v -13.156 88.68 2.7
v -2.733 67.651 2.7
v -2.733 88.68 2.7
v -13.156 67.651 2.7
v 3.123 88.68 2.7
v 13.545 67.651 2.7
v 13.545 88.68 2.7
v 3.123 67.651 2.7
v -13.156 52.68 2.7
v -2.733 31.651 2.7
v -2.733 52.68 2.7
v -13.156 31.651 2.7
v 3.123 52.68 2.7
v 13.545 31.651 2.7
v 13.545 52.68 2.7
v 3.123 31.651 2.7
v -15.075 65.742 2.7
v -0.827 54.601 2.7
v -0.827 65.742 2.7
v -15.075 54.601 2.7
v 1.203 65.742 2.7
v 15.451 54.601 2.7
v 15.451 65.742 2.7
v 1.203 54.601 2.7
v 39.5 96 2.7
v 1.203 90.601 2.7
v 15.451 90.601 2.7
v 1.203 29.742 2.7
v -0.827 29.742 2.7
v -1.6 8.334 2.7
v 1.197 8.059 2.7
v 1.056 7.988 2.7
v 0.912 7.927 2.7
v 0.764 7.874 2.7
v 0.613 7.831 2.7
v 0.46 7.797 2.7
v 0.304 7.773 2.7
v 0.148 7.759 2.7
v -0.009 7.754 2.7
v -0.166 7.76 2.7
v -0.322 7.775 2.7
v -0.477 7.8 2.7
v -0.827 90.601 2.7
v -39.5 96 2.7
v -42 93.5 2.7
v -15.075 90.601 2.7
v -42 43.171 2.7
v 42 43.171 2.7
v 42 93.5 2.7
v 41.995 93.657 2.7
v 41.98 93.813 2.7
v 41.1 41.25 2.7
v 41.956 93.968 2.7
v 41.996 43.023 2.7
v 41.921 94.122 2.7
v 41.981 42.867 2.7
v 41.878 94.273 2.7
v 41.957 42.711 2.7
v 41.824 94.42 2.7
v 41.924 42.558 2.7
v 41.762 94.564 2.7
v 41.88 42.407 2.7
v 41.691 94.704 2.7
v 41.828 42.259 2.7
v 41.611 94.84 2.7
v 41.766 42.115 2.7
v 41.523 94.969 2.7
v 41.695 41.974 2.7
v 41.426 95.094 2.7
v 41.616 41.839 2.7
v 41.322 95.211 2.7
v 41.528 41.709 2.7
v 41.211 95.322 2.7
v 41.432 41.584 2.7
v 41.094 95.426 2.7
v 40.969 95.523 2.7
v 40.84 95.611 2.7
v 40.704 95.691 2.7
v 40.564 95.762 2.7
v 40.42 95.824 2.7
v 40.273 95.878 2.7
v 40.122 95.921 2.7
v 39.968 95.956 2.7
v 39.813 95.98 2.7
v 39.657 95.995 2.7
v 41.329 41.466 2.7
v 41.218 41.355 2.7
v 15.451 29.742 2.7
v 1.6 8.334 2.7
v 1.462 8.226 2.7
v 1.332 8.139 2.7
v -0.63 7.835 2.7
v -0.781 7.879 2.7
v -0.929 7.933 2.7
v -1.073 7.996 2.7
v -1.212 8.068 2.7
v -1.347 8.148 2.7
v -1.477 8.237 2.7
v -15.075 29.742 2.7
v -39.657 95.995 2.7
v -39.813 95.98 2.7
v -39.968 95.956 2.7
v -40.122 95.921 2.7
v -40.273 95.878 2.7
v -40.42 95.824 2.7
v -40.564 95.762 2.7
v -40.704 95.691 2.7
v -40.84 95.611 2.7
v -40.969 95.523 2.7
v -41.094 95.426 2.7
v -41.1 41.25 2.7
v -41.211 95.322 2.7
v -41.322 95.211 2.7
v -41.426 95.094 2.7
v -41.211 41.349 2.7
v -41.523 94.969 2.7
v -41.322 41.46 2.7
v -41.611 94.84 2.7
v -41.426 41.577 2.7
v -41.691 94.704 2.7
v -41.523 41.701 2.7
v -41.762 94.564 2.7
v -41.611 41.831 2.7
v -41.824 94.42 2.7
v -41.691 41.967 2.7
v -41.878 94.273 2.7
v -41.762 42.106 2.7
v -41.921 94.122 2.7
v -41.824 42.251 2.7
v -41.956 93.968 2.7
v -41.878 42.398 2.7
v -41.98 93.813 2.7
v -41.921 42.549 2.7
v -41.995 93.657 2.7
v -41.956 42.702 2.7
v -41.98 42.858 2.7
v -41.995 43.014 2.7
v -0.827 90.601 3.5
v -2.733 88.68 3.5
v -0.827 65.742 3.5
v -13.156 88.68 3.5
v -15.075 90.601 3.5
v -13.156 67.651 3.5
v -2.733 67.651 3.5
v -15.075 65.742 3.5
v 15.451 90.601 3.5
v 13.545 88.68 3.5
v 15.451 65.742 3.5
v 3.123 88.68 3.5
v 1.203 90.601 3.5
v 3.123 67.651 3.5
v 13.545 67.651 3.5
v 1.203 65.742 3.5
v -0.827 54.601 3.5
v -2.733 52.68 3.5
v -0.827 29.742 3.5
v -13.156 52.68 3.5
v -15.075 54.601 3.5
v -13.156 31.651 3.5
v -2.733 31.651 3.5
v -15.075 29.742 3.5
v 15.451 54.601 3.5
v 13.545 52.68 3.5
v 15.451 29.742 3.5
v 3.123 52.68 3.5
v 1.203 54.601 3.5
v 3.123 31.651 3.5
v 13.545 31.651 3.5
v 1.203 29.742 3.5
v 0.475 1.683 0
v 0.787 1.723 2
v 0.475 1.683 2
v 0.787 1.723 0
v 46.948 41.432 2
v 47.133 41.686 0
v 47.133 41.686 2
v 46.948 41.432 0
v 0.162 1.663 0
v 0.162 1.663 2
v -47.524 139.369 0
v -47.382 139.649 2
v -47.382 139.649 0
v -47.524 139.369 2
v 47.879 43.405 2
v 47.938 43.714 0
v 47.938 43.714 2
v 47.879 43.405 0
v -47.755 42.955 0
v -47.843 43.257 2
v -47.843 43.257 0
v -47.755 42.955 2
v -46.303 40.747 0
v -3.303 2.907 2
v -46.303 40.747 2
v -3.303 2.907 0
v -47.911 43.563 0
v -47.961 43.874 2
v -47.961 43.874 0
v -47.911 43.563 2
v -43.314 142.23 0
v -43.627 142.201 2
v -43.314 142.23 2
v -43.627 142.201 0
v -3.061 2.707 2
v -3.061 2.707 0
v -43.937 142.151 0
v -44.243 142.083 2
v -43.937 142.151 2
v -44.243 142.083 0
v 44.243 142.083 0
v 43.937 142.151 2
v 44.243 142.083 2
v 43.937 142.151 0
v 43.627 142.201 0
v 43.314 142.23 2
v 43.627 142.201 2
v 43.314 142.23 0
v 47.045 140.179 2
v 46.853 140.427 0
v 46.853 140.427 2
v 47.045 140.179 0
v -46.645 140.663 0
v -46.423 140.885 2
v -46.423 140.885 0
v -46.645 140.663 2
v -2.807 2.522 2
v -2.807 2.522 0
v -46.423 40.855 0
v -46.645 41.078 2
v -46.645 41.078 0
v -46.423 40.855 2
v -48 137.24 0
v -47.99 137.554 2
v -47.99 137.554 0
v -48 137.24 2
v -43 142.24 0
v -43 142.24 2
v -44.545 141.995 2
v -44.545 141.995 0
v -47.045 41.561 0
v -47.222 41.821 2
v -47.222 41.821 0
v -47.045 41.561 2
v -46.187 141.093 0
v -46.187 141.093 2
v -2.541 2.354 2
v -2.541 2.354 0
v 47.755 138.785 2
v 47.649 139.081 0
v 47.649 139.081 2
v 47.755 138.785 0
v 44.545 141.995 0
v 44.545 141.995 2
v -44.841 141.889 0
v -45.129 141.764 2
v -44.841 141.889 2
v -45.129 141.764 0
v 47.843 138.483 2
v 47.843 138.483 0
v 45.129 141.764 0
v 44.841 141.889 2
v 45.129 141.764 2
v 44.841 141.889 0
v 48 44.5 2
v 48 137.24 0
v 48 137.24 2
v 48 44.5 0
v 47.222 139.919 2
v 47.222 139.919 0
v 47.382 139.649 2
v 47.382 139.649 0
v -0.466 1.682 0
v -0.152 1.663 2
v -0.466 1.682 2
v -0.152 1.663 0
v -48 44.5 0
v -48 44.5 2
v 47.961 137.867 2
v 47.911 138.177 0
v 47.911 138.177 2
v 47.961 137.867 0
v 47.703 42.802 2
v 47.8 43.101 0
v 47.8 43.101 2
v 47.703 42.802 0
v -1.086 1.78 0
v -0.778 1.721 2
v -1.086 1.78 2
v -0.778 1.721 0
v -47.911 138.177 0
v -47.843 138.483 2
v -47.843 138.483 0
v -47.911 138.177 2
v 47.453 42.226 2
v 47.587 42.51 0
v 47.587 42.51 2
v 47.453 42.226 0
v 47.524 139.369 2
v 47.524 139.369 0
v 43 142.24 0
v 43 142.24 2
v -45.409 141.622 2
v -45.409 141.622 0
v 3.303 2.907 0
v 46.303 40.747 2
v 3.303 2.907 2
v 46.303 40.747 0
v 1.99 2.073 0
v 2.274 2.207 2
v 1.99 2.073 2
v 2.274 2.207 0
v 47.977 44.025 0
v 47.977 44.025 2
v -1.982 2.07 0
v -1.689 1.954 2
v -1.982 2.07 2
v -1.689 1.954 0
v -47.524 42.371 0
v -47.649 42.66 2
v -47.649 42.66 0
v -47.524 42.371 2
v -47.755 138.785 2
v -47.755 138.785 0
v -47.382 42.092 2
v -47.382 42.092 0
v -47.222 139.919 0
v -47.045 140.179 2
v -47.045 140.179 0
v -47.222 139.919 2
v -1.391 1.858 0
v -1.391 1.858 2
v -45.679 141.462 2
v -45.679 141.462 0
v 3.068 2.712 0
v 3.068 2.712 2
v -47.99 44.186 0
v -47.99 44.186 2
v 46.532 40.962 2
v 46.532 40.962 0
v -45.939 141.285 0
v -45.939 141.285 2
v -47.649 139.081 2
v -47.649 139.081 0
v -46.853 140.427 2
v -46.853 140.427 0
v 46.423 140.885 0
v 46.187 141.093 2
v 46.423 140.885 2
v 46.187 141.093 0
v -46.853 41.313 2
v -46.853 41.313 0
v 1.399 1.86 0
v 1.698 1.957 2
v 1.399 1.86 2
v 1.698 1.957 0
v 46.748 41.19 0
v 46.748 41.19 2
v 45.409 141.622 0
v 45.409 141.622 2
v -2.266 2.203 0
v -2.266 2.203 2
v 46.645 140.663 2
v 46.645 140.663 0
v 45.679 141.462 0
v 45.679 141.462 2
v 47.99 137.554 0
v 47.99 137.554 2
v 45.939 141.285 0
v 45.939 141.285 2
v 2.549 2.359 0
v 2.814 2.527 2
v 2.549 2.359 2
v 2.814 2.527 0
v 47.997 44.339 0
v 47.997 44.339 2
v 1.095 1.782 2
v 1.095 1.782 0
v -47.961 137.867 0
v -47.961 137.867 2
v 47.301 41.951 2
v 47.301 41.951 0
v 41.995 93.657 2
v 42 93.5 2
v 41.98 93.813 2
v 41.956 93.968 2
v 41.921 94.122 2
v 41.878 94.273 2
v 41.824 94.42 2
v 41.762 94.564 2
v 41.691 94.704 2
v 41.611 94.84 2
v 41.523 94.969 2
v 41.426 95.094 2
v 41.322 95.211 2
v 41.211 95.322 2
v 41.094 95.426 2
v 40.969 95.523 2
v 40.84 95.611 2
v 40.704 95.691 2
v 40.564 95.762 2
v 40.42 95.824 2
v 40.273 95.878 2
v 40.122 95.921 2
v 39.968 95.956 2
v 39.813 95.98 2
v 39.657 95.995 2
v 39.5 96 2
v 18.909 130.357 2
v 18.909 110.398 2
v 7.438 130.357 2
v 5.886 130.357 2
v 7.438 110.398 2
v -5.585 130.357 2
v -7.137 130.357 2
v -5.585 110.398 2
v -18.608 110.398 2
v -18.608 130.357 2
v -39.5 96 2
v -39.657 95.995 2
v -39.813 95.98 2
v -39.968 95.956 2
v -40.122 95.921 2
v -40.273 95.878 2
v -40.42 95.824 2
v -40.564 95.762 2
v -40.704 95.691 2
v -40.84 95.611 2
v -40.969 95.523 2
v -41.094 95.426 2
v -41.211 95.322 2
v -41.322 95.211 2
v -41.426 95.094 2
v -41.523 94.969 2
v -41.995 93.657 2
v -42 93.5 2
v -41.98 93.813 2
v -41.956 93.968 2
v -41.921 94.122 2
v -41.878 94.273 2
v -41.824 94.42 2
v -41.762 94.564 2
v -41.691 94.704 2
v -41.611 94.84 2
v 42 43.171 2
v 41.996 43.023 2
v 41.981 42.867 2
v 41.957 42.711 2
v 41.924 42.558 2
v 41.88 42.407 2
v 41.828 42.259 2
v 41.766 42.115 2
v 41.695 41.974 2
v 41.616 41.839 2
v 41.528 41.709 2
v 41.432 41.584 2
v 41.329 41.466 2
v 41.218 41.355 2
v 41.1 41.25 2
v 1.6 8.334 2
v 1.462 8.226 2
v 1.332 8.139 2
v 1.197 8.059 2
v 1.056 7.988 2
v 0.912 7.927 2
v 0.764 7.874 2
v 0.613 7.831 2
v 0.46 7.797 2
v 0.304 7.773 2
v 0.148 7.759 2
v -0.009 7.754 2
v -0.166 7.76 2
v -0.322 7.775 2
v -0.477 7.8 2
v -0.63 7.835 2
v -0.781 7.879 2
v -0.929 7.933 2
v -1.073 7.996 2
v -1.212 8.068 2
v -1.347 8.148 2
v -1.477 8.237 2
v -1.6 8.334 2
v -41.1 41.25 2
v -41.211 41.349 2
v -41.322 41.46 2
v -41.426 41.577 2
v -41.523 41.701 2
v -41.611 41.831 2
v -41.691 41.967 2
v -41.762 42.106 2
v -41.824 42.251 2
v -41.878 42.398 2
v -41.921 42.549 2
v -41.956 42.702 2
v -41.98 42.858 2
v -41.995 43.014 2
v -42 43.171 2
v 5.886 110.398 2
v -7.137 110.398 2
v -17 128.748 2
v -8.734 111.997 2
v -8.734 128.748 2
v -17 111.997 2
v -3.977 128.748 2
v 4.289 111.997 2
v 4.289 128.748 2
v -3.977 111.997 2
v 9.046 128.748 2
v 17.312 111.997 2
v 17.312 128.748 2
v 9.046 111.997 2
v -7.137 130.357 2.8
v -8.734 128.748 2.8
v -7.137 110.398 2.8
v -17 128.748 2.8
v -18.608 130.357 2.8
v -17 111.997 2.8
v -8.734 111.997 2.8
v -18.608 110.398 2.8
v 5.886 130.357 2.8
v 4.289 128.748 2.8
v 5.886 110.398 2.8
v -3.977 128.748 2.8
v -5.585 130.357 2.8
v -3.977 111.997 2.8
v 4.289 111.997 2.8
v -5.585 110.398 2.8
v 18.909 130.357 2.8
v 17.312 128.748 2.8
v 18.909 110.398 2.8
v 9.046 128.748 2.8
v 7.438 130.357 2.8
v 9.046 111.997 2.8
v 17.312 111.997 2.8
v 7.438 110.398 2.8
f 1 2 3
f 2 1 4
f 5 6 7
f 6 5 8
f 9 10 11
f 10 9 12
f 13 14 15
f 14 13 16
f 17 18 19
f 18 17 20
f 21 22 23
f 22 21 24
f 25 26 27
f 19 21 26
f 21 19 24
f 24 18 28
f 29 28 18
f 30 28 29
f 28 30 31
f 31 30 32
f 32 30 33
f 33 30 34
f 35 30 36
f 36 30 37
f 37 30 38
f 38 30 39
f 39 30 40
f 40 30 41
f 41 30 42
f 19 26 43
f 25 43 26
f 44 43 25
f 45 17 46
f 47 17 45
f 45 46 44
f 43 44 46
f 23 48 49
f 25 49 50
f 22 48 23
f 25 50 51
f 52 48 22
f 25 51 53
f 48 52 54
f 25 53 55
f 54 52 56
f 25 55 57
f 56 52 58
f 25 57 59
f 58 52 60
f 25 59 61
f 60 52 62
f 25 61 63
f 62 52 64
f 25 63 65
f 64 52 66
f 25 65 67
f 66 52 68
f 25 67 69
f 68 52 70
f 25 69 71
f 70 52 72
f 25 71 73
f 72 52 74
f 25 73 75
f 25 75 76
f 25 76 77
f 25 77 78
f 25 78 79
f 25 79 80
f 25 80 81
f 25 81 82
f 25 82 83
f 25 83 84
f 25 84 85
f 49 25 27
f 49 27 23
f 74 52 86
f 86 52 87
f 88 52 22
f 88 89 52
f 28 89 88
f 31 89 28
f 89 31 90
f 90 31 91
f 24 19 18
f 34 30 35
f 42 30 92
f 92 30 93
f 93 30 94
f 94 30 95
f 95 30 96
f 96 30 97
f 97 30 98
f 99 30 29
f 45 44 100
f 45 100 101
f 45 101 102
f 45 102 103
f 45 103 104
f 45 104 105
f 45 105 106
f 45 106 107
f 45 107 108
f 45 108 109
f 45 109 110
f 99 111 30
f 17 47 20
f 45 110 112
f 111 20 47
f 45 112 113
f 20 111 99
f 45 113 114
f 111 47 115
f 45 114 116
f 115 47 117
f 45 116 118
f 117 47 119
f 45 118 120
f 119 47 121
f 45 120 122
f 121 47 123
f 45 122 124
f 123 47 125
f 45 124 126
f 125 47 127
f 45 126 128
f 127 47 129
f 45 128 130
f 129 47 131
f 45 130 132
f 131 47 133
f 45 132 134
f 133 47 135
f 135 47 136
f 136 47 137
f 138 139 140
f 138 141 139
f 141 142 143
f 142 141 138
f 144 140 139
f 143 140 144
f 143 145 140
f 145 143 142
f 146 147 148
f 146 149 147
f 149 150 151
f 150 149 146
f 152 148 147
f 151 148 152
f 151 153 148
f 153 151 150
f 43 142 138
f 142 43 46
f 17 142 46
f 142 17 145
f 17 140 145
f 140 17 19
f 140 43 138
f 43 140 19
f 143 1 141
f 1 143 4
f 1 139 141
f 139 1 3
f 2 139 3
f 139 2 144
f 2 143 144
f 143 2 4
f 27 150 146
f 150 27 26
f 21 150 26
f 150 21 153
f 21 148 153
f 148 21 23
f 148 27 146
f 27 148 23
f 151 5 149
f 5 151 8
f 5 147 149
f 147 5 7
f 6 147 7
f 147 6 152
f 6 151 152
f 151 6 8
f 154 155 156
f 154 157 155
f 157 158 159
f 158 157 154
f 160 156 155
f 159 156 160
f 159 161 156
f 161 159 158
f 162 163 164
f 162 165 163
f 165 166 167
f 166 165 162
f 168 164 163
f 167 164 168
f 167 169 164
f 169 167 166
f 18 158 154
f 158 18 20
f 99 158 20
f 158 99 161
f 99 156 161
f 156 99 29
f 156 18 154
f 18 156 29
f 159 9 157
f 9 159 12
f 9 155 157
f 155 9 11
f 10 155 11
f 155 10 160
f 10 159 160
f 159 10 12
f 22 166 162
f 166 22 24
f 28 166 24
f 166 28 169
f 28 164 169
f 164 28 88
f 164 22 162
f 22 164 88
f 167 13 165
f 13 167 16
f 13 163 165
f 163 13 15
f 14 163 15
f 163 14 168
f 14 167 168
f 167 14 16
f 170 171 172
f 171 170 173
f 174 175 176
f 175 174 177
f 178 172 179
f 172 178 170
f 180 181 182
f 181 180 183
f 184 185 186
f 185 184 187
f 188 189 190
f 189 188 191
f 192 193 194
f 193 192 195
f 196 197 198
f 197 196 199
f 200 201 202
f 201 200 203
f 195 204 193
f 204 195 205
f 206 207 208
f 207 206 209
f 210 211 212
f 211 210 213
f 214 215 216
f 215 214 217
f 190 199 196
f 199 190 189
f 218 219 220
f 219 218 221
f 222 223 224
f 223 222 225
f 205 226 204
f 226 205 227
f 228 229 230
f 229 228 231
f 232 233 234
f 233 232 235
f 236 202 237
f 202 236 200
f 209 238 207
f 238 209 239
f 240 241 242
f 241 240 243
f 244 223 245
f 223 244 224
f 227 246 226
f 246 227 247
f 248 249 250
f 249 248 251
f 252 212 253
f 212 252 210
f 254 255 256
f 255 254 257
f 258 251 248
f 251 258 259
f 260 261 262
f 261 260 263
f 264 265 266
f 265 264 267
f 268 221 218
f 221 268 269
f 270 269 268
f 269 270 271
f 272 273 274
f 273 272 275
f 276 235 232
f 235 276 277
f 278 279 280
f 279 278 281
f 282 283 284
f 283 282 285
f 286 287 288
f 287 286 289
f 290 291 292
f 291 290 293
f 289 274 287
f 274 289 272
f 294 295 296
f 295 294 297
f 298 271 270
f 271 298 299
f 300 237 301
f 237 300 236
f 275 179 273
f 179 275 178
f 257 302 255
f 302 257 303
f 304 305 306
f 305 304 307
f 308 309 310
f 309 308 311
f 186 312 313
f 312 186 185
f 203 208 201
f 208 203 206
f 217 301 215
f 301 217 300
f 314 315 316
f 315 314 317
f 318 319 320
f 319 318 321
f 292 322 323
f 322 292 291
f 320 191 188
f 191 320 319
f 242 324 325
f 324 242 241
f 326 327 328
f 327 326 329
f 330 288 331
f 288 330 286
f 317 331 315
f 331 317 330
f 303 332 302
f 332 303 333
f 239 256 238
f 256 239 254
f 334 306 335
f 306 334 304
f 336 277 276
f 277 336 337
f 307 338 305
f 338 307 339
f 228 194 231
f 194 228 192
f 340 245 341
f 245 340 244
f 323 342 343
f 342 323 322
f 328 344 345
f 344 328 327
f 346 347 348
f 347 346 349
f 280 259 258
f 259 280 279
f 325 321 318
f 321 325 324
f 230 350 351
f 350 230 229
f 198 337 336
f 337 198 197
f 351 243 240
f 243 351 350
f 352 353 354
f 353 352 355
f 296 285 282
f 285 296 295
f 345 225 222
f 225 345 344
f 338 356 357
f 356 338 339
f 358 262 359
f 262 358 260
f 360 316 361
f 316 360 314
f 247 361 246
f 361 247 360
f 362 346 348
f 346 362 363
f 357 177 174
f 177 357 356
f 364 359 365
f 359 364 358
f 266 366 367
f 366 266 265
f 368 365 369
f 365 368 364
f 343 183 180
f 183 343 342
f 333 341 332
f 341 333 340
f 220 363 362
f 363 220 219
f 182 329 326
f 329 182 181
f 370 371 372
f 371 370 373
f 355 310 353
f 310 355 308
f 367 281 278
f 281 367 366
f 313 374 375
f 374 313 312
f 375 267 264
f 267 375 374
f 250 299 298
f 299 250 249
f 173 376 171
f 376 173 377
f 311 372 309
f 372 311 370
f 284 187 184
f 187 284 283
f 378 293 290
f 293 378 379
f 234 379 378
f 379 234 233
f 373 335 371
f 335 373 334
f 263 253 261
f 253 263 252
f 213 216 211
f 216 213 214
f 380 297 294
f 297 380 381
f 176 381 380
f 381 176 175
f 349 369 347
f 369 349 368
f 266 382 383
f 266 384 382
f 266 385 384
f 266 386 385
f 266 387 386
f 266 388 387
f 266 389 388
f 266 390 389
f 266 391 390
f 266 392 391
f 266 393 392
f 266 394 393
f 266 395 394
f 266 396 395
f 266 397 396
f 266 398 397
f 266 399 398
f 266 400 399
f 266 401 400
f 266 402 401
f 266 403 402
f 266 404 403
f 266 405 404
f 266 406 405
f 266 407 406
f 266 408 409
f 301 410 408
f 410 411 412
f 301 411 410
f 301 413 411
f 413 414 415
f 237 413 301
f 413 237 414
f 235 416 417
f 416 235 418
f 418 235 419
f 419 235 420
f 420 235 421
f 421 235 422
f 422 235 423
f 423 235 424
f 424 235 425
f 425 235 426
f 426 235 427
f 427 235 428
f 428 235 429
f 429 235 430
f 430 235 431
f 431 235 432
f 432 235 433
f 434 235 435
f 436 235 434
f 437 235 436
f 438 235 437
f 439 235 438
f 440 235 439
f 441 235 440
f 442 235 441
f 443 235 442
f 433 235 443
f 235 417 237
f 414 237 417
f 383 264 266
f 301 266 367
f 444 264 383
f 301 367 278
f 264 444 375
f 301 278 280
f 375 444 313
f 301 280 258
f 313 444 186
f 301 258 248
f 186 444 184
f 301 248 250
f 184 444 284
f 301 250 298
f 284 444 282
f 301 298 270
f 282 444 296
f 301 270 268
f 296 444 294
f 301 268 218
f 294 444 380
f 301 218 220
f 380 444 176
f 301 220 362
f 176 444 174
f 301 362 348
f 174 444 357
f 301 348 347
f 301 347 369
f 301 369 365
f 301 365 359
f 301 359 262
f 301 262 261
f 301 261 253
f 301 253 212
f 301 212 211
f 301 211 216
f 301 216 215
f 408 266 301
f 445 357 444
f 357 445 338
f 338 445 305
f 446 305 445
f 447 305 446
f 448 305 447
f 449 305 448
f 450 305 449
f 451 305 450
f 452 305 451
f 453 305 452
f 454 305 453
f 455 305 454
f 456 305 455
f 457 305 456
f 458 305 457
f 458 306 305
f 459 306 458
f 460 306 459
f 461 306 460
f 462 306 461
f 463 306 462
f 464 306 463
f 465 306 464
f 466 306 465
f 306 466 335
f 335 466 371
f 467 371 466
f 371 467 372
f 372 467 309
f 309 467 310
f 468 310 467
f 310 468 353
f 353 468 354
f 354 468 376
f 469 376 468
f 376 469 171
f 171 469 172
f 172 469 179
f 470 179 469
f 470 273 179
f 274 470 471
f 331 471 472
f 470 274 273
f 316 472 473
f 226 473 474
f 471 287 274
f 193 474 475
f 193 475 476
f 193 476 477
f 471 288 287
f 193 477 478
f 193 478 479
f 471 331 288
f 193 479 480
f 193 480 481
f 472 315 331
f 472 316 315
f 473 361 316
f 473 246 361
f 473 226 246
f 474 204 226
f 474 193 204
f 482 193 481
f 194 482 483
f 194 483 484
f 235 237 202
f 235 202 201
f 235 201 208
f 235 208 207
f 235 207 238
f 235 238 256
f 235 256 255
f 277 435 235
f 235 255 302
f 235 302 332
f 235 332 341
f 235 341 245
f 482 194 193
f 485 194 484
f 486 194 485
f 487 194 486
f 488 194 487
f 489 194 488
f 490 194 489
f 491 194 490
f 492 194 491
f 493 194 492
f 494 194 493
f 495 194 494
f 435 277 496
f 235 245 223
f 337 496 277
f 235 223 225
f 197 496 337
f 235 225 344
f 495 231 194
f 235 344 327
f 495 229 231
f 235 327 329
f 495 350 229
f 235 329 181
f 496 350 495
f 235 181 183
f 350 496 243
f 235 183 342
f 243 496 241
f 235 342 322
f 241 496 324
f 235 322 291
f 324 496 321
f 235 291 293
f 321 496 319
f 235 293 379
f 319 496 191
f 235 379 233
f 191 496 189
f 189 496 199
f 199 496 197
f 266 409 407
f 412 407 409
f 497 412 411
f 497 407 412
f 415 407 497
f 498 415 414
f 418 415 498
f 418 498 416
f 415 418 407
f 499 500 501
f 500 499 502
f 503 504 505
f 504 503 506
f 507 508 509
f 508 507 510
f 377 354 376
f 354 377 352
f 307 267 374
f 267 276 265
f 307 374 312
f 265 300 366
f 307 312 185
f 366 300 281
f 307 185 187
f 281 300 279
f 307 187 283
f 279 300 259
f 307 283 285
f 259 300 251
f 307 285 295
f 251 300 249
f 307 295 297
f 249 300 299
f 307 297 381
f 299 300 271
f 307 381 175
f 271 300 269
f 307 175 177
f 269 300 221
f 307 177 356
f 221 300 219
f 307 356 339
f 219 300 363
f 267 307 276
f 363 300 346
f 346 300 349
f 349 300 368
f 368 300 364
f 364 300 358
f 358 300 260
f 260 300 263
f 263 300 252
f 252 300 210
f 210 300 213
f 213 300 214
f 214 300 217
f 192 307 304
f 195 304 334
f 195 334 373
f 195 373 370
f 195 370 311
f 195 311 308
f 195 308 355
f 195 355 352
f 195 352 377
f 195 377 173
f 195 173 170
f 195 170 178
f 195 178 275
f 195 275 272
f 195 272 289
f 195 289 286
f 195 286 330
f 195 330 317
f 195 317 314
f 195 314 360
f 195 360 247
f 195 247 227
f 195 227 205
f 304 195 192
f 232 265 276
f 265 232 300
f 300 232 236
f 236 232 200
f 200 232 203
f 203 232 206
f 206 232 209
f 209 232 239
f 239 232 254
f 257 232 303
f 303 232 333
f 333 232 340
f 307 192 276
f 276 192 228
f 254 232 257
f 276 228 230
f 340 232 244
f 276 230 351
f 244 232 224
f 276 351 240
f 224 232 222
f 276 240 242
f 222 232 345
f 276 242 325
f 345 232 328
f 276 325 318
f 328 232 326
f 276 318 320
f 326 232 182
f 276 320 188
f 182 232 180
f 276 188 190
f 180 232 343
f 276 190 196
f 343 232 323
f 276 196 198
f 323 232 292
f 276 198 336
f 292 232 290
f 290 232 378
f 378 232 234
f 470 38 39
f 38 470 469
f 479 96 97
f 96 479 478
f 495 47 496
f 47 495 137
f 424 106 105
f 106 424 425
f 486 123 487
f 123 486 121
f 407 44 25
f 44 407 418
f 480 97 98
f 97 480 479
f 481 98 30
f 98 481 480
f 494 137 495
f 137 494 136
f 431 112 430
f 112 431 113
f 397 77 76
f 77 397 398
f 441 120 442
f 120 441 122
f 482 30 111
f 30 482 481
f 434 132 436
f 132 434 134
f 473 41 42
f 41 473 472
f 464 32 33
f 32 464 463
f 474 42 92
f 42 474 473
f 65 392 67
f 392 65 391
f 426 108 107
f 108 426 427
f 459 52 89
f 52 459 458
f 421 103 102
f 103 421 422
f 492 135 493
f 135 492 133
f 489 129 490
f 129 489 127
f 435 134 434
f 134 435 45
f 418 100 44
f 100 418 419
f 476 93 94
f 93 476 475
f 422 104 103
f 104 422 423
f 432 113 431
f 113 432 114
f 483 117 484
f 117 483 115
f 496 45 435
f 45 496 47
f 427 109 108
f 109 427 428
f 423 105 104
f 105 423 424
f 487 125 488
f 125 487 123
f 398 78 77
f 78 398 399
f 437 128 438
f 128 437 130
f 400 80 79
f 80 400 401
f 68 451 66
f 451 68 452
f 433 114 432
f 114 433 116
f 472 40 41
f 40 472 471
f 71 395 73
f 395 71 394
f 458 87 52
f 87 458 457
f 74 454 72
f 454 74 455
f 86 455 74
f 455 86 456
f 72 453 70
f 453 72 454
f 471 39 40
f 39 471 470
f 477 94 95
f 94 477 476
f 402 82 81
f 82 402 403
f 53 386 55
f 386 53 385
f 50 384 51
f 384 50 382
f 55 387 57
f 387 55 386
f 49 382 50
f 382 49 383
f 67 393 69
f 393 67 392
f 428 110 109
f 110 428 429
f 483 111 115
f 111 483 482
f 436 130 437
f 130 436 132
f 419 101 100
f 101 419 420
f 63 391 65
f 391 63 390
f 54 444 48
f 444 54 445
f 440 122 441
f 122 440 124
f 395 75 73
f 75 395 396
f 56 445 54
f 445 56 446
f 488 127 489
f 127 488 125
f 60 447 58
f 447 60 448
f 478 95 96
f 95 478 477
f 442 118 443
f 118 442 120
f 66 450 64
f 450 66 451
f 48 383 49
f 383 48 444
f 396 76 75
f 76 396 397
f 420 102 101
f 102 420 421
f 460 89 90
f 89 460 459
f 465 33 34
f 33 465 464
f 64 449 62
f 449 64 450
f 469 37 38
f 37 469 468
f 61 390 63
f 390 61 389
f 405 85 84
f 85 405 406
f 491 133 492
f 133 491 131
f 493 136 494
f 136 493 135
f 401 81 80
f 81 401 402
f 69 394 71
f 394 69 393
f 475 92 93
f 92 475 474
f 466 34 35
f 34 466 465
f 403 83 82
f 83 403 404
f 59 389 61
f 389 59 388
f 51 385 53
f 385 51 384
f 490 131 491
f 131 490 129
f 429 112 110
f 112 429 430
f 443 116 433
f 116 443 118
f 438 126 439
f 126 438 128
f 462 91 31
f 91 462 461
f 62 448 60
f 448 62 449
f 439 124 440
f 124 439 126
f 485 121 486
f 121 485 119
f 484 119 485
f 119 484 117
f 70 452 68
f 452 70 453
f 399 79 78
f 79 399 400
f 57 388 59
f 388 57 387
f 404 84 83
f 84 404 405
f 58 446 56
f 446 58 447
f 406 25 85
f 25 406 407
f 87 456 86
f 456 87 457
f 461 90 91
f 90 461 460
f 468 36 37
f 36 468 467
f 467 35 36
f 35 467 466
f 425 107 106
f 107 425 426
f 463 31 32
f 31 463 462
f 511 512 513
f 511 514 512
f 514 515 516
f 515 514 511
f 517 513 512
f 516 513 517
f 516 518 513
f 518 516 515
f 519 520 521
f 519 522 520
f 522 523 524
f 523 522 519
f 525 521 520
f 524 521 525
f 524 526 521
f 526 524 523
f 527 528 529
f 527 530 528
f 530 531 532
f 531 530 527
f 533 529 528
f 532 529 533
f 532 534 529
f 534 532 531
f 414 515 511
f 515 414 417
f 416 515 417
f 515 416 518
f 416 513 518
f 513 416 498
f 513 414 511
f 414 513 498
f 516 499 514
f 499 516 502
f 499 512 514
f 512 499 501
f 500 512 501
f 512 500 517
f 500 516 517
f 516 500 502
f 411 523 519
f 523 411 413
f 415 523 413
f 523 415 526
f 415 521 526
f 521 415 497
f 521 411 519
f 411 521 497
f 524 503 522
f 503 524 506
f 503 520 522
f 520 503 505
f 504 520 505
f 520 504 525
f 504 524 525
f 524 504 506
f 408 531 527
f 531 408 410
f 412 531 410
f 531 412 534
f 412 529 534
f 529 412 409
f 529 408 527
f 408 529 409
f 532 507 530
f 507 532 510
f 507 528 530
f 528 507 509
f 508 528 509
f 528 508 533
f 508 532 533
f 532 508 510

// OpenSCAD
/* [文字设置] */
// 上方可自定义文字。
top_text = "梁周线";
// 下方文字第一行。
lower_text_line_1 = "此生";
// 下方文字第二行。
lower_text_line_2 = "必驾";
// Windows 常见中文字体；如文字无法显示，可改成系统中已有的字体。
font_name = "Microsoft YaHei:style=Bold";
top_text_size = 16; // [10:0.5:20]
lower_text_size = 20; // [16:0.5:24]

/* [Hidden] */
part = "all";
$fn = 100;

sign_width = 96;
rectangle_height = 100;
triangle_height_ratio = 0.44;
base_thickness = 2.0;
lower_panel_thickness = 0.7;
text_thickness = 0.8;
outer_corner_radius = 5;
border_width = 5.2;
lower_panel_width = 84;
lower_panel_top_y = 96;
lower_panel_tip_y = 7;
lower_panel_triangle_height = 35;
lower_panel_corner_radius = 2.5;
lower_text_line_gap = lower_text_size * 1.8;
text_stroke = 0.18;

triangle_height = sign_width * triangle_height_ratio;
shield_height = rectangle_height + triangle_height;

gold_color = [0.78, 0.54, 0.22];
dark_color = [0.07, 0.08, 0.08];
top_text_color = dark_color;
lower_text_color = gold_color;

module rounded_polygon(points, radius) {
  offset(r = radius) {
    offset(delta = -radius) {
      polygon(points);
    }
  }
}

module shield_2d(width, rect_height, tri_height, radius) {
  safe_radius = min(radius, width / 10, rect_height / 3, tri_height / 4);
  rounded_polygon(
    [
      [-width / 2, tri_height],
      [-width / 2, tri_height + rect_height],
      [width / 2, tri_height + rect_height],
      [width / 2, tri_height],
      [0, 0]
    ],
    safe_radius
  );
}

module lower_panel_2d() {
  panel_rect_height = max(1, lower_panel_top_y - lower_panel_tip_y - lower_panel_triangle_height);
  translate([0, lower_panel_tip_y]) {
    shield_2d(
      lower_panel_width,
      panel_rect_height,
      lower_panel_triangle_height,
      lower_panel_corner_radius
    );
  }
}

module raised_text(label, size, height) {
  linear_extrude(height = height) {
    offset(delta = text_stroke) {
      text(label, size = size, font = font_name, halign = "center", valign = "center");
    }
  }
}

module gold_base() {
  color(gold_color) {
    linear_extrude(height = base_thickness) {
      shield_2d(sign_width, rectangle_height, triangle_height, outer_corner_radius);
    }
  }
}

module lower_dark_panel() {
  color(dark_color) {
    translate([0, 0, base_thickness]) {
      linear_extrude(height = lower_panel_thickness) {
        lower_panel_2d();
      }
    }
  }
}

module top_text_model() {
  title_y = triangle_height + rectangle_height * 0.78;
  color(top_text_color) {
    translate([0, title_y, base_thickness]) {
      raised_text(top_text, top_text_size, text_thickness);
    }
  }
}

module lower_text_model() {
  block_center_y = lower_panel_tip_y + lower_panel_triangle_height + 18;
  text_z = base_thickness + lower_panel_thickness;

  color(lower_text_color) {
    translate([0, block_center_y + lower_text_line_gap / 2, text_z]) {
      raised_text(lower_text_line_1, lower_text_size, text_thickness);
    }

    translate([0, block_center_y - lower_text_line_gap / 2, text_z]) {
      raised_text(lower_text_line_2, lower_text_size, text_thickness);
    }
  }
}

module selected_part() {
  if (part == "all") {
    gold_base();
    lower_dark_panel();
    top_text_model();
    lower_text_model();
  }

  if (part == "gold_base") {
    gold_base();
  }

  if (part == "lower_dark_panel") {
    lower_dark_panel();
  }

  if (part == "top_text") {
    top_text_model();
  }

  if (part == "lower_text") {
    lower_text_model();
  }
}

selected_part();
